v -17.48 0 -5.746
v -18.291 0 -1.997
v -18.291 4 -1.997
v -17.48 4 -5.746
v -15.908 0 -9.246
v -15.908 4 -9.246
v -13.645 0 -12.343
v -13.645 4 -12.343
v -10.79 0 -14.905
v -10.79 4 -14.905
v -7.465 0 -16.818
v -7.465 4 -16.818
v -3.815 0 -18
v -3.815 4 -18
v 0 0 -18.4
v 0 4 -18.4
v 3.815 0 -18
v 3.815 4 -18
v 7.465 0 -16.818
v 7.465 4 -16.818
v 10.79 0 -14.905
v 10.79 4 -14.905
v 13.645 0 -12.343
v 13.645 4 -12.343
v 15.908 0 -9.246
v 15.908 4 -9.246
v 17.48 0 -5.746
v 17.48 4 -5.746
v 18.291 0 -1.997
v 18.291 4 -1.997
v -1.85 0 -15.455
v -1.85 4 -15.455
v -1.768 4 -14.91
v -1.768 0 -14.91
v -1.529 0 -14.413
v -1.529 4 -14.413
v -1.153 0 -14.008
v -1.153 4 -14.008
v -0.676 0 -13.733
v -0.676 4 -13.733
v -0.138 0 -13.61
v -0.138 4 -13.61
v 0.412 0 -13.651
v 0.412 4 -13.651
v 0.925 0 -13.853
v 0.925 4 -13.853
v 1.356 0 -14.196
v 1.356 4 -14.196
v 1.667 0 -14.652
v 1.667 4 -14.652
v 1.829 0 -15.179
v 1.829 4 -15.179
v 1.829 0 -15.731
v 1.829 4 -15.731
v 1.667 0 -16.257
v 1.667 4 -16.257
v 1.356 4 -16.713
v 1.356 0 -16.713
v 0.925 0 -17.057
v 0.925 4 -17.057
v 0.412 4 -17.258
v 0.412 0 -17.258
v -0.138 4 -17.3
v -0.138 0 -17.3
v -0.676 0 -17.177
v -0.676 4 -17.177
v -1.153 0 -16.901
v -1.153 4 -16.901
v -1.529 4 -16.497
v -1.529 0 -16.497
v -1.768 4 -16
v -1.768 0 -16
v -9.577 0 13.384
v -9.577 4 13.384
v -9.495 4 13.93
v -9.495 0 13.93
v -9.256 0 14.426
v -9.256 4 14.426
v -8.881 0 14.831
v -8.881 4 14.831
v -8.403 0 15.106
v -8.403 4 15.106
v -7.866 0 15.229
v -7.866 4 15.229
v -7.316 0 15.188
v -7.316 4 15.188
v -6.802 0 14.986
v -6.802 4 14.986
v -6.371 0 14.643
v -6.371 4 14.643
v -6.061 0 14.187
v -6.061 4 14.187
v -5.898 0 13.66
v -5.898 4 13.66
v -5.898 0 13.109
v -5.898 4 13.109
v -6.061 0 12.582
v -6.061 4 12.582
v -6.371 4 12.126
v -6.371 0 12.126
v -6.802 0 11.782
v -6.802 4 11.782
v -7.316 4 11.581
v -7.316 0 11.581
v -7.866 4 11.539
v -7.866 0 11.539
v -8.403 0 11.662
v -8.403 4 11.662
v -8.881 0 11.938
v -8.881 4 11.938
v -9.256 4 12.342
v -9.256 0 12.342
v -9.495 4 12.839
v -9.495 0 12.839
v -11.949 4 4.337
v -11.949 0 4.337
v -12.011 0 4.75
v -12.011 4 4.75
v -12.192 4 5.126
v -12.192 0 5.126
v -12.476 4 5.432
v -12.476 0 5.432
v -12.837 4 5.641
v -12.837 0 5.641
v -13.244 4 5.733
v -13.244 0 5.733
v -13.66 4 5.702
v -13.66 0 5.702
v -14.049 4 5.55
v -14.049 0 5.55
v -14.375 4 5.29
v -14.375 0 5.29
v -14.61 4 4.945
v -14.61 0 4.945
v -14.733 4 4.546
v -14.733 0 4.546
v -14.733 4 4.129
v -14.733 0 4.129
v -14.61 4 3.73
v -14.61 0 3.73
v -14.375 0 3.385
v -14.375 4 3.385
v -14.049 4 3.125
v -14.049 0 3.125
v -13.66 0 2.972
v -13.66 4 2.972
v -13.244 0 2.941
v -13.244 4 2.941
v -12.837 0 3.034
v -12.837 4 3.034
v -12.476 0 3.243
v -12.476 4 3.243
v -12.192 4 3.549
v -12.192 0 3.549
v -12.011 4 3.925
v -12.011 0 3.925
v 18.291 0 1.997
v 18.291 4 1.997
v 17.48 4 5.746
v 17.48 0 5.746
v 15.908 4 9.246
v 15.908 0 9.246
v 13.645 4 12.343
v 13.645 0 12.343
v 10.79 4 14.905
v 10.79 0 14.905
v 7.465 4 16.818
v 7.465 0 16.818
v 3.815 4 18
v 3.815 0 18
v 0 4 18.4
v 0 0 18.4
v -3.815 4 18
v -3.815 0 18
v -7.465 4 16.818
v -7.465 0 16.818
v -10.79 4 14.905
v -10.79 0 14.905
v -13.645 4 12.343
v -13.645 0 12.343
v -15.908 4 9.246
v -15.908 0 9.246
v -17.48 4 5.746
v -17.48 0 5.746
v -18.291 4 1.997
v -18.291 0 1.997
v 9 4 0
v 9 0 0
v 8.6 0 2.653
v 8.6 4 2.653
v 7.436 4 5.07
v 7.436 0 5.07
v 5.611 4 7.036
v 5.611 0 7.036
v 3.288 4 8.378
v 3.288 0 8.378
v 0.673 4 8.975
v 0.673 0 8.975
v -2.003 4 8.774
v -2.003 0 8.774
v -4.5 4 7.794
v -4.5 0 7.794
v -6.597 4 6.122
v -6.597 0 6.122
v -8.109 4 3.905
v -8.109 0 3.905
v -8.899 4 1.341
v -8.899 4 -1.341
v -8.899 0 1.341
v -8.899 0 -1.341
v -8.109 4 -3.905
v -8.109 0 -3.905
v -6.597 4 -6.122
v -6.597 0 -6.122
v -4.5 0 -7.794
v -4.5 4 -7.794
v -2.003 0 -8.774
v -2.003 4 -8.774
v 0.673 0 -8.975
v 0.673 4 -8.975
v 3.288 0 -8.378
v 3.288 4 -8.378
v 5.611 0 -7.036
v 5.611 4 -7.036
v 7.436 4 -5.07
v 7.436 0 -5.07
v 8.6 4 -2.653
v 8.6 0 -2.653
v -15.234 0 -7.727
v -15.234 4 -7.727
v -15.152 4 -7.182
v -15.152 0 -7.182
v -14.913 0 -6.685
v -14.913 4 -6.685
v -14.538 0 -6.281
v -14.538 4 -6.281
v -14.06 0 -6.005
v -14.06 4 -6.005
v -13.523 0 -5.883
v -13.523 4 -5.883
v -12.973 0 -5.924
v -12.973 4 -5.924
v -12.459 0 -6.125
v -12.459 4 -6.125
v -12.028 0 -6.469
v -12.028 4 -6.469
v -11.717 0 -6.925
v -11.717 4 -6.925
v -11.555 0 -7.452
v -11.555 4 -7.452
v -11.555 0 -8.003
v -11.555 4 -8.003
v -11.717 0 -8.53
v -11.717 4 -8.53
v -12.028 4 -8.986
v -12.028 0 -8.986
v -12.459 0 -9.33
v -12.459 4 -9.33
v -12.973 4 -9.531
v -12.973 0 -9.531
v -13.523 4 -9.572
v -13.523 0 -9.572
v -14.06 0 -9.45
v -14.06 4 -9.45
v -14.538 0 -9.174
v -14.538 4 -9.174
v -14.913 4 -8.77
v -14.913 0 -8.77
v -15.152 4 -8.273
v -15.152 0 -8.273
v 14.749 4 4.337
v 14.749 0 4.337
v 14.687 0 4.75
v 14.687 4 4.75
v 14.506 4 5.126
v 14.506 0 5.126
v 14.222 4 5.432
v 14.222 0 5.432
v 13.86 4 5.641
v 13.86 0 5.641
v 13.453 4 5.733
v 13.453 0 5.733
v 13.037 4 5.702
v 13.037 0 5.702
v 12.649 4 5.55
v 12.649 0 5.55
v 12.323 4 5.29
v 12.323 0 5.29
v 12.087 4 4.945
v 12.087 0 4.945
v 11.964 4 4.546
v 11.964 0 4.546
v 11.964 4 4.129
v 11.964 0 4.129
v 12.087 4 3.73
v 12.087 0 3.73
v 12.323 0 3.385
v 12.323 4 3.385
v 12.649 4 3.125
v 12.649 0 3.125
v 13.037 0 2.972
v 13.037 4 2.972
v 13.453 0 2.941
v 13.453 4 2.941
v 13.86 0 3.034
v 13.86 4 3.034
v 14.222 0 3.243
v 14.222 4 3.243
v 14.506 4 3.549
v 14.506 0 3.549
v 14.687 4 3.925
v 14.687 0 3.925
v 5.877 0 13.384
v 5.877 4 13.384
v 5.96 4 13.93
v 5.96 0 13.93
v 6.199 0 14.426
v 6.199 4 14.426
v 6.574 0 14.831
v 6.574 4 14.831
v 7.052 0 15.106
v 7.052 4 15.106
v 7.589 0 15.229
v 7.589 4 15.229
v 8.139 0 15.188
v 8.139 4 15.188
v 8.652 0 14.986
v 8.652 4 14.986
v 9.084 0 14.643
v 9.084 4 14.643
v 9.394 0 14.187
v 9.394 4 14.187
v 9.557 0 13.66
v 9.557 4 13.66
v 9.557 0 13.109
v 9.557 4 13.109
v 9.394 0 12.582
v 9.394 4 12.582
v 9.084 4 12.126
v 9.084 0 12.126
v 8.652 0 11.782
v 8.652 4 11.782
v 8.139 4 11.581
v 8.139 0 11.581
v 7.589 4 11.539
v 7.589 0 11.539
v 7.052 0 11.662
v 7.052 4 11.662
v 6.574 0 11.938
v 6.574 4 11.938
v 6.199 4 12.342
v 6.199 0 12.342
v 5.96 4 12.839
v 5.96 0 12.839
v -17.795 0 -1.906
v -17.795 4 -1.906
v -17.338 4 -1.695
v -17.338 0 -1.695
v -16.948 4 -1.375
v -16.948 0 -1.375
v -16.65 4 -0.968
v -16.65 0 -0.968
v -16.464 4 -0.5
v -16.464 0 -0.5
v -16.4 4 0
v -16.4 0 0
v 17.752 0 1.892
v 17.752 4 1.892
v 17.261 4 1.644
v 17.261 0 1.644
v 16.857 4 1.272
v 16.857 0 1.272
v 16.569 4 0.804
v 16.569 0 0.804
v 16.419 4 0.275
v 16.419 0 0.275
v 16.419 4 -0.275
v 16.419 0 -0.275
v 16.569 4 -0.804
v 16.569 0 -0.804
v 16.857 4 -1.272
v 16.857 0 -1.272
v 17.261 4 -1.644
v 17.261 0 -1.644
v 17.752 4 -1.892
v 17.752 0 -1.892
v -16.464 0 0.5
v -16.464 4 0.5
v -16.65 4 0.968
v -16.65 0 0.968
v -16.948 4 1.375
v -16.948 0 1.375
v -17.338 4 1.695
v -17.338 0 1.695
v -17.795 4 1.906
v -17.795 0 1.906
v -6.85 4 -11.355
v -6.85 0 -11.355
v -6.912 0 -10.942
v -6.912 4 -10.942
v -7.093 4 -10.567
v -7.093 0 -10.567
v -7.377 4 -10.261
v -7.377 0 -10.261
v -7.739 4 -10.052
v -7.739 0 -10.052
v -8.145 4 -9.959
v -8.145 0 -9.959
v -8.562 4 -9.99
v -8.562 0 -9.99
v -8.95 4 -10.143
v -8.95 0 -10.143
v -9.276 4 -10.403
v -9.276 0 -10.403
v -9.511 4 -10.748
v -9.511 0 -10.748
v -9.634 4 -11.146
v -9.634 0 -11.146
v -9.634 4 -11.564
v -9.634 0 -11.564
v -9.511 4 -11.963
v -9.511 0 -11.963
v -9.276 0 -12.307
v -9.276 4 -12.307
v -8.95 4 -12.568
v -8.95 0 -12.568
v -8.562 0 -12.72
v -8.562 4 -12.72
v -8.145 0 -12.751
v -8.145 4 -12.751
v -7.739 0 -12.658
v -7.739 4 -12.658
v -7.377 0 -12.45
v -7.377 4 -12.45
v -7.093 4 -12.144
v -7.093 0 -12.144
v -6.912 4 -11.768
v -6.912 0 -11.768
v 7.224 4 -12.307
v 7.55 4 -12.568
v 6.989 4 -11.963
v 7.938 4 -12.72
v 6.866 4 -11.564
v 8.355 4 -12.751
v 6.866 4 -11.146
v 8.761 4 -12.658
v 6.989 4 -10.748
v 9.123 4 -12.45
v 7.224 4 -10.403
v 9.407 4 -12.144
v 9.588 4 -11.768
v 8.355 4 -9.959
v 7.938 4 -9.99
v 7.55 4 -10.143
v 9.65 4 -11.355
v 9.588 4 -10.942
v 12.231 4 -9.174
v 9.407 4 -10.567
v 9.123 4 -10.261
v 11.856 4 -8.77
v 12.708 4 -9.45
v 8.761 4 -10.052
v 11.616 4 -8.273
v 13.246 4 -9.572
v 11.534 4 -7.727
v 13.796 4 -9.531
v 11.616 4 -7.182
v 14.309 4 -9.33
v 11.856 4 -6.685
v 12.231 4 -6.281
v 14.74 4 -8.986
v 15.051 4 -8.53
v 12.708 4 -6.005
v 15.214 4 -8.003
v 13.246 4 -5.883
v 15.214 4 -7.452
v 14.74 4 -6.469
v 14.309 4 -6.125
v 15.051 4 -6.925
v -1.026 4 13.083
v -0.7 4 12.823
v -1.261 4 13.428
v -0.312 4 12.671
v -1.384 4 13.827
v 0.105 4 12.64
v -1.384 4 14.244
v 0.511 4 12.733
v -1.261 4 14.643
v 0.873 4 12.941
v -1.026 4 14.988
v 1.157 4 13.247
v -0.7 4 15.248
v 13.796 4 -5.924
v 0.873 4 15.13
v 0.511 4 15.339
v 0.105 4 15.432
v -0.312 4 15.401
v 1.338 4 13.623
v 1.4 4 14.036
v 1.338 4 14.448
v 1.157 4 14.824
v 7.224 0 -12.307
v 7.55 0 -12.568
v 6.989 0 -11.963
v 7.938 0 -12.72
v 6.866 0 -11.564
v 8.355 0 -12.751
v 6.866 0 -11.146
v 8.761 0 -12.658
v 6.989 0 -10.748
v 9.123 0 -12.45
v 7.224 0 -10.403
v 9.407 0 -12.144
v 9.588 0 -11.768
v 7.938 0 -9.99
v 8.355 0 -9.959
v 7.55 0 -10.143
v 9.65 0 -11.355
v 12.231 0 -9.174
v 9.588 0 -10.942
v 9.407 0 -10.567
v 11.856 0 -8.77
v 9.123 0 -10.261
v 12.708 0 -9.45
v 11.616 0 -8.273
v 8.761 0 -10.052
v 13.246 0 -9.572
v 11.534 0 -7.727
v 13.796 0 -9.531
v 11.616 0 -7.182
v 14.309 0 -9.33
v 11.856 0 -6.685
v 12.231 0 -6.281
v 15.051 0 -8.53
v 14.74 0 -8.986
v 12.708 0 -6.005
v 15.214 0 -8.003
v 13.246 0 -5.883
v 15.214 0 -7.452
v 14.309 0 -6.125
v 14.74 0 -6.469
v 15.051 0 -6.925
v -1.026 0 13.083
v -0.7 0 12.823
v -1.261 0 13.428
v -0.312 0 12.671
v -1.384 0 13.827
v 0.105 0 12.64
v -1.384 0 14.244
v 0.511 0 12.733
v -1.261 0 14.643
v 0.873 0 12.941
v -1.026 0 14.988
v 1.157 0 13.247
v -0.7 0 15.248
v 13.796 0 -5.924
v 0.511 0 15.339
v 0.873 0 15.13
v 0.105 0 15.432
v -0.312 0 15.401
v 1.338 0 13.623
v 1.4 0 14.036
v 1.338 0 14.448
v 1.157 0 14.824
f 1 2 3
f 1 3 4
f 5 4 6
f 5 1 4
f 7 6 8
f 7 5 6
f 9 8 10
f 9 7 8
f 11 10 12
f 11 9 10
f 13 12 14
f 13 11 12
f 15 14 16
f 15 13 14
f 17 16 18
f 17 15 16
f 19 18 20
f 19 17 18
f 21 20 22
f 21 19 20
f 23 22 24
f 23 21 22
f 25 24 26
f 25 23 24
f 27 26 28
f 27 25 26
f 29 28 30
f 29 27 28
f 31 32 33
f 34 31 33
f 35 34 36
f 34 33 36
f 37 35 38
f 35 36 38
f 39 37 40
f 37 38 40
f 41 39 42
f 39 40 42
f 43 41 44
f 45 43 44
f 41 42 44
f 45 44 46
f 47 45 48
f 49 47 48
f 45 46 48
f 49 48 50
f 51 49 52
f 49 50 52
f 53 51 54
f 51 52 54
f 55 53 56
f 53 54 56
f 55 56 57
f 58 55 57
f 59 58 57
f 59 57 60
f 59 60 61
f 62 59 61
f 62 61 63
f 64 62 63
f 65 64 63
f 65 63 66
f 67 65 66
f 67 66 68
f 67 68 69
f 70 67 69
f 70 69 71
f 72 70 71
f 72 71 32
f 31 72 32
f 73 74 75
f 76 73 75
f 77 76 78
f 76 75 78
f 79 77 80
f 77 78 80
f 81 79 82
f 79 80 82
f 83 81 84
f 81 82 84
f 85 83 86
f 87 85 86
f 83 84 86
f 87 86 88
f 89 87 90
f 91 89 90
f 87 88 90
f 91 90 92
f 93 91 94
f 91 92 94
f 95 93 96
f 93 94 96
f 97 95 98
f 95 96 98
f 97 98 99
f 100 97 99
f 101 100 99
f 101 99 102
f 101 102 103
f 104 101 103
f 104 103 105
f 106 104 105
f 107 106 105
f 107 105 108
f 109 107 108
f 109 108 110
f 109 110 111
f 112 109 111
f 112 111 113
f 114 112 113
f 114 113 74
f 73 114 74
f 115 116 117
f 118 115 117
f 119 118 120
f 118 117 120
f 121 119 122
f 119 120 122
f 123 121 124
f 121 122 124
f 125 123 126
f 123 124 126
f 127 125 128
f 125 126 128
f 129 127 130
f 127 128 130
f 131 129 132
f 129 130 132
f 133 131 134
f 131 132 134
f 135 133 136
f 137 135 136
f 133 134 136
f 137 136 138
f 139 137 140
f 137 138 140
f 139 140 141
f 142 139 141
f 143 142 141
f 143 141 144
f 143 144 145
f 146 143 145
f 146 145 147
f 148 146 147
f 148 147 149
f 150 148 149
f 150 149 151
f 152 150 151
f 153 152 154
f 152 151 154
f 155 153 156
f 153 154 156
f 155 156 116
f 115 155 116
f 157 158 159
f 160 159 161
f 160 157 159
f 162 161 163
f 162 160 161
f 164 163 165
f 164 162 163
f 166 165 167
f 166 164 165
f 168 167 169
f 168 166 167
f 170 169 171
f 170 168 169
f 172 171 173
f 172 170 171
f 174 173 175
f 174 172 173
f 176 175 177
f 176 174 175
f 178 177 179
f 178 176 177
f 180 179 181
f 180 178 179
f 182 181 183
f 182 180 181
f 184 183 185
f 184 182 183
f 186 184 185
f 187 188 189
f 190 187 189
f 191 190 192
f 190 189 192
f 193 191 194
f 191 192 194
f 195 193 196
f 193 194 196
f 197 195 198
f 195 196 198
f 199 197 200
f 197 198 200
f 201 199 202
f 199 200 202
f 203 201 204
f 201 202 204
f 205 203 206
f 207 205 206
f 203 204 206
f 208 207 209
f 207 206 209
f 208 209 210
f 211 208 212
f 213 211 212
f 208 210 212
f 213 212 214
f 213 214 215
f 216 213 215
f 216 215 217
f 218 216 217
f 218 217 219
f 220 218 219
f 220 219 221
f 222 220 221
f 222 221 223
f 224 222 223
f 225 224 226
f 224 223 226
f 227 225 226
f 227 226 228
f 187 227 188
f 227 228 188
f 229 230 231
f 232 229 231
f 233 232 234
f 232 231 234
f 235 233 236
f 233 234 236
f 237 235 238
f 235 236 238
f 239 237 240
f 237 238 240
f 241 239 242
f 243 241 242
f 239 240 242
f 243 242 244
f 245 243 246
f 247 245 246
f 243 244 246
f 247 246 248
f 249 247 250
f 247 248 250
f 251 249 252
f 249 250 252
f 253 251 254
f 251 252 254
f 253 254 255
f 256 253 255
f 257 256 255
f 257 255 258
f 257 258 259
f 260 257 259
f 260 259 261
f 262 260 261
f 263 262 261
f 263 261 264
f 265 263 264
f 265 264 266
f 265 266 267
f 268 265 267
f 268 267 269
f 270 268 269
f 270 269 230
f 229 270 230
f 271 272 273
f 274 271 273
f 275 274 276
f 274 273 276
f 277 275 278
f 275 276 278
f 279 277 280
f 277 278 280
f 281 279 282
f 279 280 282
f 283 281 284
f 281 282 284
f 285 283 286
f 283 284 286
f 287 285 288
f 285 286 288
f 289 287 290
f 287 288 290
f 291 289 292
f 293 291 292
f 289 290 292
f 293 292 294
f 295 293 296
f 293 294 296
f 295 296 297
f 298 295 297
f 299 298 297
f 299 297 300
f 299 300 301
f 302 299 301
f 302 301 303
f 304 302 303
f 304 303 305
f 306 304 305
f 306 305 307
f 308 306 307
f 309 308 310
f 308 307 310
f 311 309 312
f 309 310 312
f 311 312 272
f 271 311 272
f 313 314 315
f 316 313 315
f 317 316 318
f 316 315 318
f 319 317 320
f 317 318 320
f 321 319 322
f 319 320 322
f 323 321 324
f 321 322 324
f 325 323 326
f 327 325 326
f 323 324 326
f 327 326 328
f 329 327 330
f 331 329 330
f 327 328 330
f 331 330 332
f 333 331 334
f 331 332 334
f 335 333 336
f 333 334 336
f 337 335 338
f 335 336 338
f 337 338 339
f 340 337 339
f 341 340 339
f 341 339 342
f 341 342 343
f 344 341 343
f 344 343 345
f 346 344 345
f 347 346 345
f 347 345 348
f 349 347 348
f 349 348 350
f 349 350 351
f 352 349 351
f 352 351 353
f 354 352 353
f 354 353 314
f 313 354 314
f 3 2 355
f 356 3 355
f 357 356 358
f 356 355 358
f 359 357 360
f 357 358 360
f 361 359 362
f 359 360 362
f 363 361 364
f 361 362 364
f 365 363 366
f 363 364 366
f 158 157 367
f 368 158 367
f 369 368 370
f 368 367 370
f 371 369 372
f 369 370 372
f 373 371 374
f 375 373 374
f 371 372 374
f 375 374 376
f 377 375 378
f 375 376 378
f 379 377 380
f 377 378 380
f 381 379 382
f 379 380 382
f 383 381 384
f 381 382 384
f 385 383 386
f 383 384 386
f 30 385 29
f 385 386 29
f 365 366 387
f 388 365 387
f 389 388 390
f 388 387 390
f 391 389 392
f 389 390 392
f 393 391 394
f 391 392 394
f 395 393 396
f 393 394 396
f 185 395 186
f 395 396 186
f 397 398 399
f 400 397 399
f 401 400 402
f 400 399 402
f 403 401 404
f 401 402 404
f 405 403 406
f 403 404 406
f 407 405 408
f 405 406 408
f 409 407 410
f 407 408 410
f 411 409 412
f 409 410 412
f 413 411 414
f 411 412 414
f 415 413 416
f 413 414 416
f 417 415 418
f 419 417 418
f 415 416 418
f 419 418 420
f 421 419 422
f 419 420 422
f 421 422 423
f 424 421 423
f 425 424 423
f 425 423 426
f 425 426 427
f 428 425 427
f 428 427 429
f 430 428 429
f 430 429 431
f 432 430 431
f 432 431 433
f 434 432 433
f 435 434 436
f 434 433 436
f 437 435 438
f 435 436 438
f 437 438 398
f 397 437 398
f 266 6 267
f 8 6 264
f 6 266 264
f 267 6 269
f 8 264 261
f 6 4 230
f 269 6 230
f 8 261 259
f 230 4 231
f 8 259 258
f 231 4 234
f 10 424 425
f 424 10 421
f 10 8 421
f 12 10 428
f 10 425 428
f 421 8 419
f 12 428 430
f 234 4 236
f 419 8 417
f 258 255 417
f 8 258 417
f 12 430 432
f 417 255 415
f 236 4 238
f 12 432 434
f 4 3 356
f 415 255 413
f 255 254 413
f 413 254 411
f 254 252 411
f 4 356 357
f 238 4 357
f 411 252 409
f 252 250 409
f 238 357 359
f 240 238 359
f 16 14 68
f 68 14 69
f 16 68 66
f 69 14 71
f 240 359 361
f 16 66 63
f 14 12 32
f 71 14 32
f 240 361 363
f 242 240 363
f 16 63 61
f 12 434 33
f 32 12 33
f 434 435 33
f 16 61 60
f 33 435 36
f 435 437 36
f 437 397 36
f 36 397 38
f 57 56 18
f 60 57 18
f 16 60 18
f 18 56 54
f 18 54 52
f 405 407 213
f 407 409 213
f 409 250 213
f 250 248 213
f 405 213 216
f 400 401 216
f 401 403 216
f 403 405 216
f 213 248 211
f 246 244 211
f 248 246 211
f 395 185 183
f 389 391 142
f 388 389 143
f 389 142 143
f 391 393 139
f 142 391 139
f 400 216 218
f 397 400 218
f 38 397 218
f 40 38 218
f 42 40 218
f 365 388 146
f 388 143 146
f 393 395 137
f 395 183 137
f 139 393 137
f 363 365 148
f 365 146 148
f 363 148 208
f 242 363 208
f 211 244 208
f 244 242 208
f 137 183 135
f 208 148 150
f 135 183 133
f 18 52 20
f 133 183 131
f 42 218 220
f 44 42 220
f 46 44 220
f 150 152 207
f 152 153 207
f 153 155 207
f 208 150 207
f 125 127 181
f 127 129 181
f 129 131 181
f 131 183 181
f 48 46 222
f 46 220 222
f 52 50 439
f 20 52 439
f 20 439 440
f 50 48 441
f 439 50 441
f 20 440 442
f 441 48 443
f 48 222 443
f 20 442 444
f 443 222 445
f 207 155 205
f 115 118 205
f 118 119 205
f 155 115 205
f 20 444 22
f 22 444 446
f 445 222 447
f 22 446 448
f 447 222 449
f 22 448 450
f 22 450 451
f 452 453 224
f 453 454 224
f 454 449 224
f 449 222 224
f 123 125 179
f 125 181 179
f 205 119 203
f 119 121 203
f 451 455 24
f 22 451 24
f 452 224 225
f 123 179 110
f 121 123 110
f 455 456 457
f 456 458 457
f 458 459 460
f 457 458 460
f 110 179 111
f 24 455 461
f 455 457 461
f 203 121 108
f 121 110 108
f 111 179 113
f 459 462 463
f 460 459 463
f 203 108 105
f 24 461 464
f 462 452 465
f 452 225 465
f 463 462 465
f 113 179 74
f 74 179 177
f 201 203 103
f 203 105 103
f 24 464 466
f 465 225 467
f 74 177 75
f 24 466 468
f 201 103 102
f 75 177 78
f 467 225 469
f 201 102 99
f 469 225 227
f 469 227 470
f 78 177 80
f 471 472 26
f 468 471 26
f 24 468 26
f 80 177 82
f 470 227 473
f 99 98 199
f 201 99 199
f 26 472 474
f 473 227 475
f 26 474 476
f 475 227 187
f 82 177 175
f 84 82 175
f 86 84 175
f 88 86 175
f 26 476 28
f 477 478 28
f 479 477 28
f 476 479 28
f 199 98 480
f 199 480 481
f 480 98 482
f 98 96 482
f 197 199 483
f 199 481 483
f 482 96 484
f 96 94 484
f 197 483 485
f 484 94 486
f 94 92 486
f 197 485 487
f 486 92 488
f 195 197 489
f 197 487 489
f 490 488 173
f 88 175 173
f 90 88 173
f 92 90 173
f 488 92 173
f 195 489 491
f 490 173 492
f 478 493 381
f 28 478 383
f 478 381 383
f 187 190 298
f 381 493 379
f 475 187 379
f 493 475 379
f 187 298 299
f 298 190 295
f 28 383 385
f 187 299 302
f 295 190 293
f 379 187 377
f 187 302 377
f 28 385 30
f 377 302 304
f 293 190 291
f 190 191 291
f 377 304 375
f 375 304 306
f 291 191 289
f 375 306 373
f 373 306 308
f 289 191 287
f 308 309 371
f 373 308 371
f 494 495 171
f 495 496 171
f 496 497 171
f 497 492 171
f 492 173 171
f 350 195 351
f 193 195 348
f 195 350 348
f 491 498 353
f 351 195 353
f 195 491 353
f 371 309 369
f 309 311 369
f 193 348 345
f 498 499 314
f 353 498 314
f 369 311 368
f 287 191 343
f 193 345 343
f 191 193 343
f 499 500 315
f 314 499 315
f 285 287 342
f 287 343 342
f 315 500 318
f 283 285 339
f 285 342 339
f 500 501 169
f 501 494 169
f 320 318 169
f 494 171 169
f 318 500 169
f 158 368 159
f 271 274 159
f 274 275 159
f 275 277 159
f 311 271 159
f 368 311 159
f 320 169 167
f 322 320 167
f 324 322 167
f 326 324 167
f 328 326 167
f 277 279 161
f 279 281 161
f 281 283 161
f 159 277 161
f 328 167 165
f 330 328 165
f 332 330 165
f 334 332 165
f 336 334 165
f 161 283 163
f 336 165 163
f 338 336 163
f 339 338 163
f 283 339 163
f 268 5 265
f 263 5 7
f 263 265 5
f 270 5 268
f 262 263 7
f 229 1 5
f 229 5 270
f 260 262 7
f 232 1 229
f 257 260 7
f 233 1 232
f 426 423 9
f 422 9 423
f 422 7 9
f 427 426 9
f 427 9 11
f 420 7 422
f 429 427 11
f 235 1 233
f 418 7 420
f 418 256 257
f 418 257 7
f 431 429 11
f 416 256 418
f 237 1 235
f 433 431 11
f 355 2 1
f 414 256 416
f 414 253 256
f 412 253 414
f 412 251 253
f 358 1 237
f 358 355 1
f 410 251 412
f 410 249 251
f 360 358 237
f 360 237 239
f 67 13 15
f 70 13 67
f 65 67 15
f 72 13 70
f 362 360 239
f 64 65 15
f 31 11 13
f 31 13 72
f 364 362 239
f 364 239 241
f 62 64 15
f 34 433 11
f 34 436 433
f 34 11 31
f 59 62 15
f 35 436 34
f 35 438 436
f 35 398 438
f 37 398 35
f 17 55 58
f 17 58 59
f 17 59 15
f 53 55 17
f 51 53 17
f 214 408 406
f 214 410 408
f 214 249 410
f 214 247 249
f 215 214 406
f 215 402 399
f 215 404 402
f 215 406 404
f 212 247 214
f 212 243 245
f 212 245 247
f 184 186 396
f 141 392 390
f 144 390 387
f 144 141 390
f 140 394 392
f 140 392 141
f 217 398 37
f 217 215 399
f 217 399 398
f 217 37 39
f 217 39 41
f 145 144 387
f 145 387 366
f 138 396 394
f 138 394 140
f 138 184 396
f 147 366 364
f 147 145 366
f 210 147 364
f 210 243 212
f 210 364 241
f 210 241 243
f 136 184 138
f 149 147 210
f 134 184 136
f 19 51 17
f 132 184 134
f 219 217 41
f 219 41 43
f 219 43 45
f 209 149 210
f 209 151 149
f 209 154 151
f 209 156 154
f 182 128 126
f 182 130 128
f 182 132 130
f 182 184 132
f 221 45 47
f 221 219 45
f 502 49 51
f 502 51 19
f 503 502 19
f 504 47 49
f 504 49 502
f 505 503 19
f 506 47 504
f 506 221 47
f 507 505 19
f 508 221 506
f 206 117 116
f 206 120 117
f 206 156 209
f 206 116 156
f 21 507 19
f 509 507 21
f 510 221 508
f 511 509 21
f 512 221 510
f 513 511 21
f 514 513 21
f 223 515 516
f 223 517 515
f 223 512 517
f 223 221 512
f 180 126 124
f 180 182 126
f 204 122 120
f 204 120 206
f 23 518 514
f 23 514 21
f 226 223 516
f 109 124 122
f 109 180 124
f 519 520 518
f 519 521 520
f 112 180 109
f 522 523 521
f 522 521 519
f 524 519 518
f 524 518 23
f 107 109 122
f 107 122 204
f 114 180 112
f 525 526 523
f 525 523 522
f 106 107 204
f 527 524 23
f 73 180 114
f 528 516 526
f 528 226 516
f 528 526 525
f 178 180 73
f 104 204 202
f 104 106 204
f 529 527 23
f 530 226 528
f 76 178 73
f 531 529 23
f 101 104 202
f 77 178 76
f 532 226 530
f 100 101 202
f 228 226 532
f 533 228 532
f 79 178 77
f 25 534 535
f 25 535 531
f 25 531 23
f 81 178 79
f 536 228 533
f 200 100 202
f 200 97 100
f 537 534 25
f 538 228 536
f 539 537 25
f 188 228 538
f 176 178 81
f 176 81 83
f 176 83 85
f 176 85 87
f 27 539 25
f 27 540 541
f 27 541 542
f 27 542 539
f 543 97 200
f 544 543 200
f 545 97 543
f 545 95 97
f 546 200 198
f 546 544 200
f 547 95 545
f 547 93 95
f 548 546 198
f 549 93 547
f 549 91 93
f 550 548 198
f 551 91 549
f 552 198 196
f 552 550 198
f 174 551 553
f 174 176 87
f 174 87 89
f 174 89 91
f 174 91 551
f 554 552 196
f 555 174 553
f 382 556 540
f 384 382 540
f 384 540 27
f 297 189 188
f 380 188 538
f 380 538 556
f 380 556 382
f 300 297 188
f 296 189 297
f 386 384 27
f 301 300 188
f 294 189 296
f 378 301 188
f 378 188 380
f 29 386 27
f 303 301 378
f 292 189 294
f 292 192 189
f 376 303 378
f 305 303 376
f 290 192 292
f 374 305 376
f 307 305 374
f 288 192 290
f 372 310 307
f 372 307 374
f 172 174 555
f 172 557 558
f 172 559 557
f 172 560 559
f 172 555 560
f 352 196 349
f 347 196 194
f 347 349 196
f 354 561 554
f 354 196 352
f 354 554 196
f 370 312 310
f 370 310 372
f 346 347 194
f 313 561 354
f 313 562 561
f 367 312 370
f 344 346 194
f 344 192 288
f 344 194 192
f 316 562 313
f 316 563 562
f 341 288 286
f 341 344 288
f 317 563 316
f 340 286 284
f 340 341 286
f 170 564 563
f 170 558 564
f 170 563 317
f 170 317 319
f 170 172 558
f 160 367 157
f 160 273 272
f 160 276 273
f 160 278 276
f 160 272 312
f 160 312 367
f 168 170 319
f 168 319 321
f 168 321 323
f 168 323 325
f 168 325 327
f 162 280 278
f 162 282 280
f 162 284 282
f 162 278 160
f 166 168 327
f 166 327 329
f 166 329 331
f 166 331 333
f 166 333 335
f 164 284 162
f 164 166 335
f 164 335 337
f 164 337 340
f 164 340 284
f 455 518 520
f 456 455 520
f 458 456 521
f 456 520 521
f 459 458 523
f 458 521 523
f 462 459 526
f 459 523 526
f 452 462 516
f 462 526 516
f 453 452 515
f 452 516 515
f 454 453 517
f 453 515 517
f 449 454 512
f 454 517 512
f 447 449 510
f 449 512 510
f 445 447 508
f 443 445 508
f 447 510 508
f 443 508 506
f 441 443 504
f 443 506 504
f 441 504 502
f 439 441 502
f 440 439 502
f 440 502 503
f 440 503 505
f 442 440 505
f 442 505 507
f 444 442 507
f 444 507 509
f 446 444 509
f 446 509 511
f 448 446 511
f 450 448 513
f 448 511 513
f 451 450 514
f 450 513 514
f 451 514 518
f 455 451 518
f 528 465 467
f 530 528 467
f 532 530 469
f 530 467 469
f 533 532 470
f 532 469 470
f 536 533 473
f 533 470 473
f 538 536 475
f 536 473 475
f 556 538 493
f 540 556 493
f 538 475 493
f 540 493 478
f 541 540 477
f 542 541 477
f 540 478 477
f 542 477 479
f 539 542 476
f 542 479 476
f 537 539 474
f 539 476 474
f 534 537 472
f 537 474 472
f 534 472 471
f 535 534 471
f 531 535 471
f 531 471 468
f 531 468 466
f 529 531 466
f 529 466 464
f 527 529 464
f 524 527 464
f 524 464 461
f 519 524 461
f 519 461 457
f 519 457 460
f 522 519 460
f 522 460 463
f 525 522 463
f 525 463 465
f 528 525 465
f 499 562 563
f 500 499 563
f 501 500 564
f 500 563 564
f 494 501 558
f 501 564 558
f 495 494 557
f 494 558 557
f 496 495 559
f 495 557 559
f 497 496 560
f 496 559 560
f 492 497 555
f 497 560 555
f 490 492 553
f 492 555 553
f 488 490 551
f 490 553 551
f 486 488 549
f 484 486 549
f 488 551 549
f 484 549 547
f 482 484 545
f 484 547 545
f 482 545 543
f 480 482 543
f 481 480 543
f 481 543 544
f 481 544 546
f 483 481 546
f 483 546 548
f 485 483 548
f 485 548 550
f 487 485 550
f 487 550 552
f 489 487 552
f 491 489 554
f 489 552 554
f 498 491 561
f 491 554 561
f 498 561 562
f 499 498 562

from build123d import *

# Parameters (mm, degrees)
F0_R     = 18.4
F0_R_2   = 1.4
F0_R_3   = 9
F1_DEPTH = 4
F2_R     = 1.85
F3_DEPTH = 25
F5_DEPTH = 25


with BuildPart() as f1:
    # F0 (on Front) → F1 (new body)
    with BuildSketch(Plane.XZ):
        Circle(F0_R)
        with Locations((-8.25, -11.3551508439)):
            Circle(F0_R_2, mode=Mode.SUBTRACT)
        with Locations((8.25, -11.3551508439)):
            Circle(F0_R_2, mode=Mode.SUBTRACT)
        with Locations((-13.3487804072, 4.337281675)):
            Circle(F0_R_2, mode=Mode.SUBTRACT)
        Circle(F0_R_3, mode=Mode.SUBTRACT)
        with Locations((13.3487804072, 4.337281675)):
            Circle(F0_R_2, mode=Mode.SUBTRACT)
        with Locations((0, 14.0357383378)):
            Circle(F0_R_2, mode=Mode.SUBTRACT)
    extrude(amount=-F1_DEPTH)

    # F2 (on face) → F3 (cut)
    with BuildSketch(Plane(origin=(0, 4, 0), x_dir=(-1, 0, 0), z_dir=(0, 1, 0))):
        with Locations((0, -15.4548132206)):
            Circle(F2_R)
        with Locations((13.3842608598, -7.7274066103)):
            Circle(F2_R)
        with Locations((-13.3842608598, -7.7274066103)):
            Circle(F2_R)
        with Locations((-7.7274066103, 13.3842608598)):
            Circle(F2_R)
        with Locations((7.7274066103, 13.3842608598)):
            Circle(F2_R)
    extrude(amount=-F3_DEPTH, mode=Mode.SUBTRACT)

    # F4 (on face) → F5 (cut)
    with BuildSketch(Plane.XZ):
        with BuildLine():
            ThreePointArc((-18.2913043478, -1.9970441295), (-16.9478651398, -1.3752470134), (-16.4, 0))
            ThreePointArc((-16.4, 0), (-16.9478651398, 1.3752470134), (-18.2913043478, 1.9970441295))
            ThreePointArc((-18.2913043478, 1.9970441295), (-18.4, 0), (-18.2913043478, -1.9970441295))
        make_face()
        with BuildLine():
            ThreePointArc((18.4, 0), (18.3728059915, 1), (18.2913043478, 1.9970441295))
            ThreePointArc((18.2913043478, 1.9970441295), (16.4, 0), (18.2913043478, -1.9970441295))
            ThreePointArc((18.2913043478, -1.9970441295), (18.3728059915, -1), (18.4, 0))
        make_face()
    extrude(amount=-F5_DEPTH, mode=Mode.SUBTRACT)


solid = f1.part
